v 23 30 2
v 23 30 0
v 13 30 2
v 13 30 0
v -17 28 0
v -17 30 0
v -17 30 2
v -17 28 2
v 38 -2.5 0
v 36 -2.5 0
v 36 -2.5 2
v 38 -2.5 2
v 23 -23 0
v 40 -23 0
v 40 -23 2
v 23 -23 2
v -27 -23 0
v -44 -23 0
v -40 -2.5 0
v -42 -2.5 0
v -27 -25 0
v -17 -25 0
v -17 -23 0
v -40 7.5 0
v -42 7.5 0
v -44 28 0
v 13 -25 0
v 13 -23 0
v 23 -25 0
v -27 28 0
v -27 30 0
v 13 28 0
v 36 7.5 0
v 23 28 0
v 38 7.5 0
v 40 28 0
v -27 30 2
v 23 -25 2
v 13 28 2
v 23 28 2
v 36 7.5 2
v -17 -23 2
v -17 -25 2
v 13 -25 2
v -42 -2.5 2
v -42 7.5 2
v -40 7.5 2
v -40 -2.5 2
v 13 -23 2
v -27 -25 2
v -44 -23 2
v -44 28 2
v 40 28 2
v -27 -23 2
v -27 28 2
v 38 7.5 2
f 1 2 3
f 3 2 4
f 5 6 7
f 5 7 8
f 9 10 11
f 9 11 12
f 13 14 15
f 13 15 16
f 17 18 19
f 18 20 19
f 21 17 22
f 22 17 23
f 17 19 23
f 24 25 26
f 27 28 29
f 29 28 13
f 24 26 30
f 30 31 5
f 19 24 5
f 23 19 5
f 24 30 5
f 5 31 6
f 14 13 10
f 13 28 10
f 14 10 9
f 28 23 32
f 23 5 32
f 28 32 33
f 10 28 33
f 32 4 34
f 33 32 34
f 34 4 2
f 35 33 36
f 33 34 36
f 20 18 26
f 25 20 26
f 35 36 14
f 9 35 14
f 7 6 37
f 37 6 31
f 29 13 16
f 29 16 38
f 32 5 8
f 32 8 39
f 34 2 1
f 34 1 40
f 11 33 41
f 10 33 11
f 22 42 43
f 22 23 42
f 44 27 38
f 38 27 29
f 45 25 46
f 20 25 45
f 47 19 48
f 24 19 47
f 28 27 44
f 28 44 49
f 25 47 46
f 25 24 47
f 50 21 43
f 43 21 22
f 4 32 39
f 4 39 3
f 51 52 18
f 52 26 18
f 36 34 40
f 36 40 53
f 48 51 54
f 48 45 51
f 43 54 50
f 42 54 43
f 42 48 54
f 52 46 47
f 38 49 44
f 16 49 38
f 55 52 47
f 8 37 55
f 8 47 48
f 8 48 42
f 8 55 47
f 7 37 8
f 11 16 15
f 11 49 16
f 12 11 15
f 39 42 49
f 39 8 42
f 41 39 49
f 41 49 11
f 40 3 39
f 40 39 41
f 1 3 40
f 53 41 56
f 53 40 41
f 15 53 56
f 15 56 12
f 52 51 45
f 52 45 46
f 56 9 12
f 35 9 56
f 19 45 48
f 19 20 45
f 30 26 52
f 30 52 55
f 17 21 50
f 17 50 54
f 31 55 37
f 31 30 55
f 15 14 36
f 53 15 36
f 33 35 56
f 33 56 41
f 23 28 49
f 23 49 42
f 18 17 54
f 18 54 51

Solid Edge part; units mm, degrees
sketch "Sketch1" plane through (0, 0, 0) normal (0, 0, 1) x (1, 0, 0)
  line L0 (40, -25) -> (40, 30)
  line L1 (40, 30) -> (-44, 30)
  line L2 (-44, 30) -> (-44, -25)
  line L3 (-44, -25) -> (40, -25)
extrude "ExtrudedProtrusion_3" add sketch "Sketch1" along normal blind 2
sketch "Sketch2" plane through (0, 0, 0) normal (0, 0, 1) x (1, 0, 0)
  line L0 (-44, 28) -> (-27, 28)
  line L1 (-27, 28) -> (-27, 30)
  line L2 (-27, 30) -> (-44, 30)
  line L3 (-44, 30) -> (-44, 28)
extrude "ExtrudedCutout_9" cut sketch "Sketch2" along normal blind 2
sketch "Sketch3" plane through (0, 0, 0) normal (0, 0, 1) x (1, 0, 0)
  line L0 (-17, 28) -> (13, 28)
  line L1 (13, 28) -> (13, 30)
  line L2 (13, 30) -> (-17, 30)
  line L3 (-17, 30) -> (-17, 28)
extrude "ExtrudedCutout_10" cut sketch "Sketch3" along normal blind 2
sketch "Sketch4" plane through (0, 0, 0) normal (0, 0, 1) x (1, 0, 0)
  line L0 (23, 28) -> (40, 28)
  line L1 (40, 28) -> (40, 30)
  line L2 (40, 30) -> (23, 30)
  line L3 (23, 30) -> (23, 28)
extrude "ExtrudedCutout_11" cut sketch "Sketch4" along normal blind 2
sketch "Sketch5" plane through (0, 0, 0) normal (0, 0, 1) x (1, 0, 0)
  line L0 (38, -2.5) -> (38, 7.5)
  line L1 (38, 7.5) -> (36, 7.5)
  line L2 (36, 7.5) -> (36, -2.5)
  line L3 (36, -2.5) -> (38, -2.5)
extrude "ExtrudedCutout_12" cut sketch "Sketch5" along normal blind 2
sketch "Sketch6" plane through (0, 0, 0) normal (0, 0, 1) x (1, 0, 0)
  line L0 (40, -23) -> (23, -23)
  line L1 (23, -23) -> (23, -25)
  line L2 (23, -25) -> (40, -25)
  line L3 (40, -25) -> (40, -23)
extrude "ExtrudedCutout_13" cut sketch "Sketch6" along normal blind 2
sketch "Sketch7" plane through (0, 0, 0) normal (0, 0, 1) x (1, 0, 0)
  line L0 (13, -23) -> (-17, -23)
  line L1 (-17, -23) -> (-17, -25)
  line L2 (-17, -25) -> (13, -25)
  line L3 (13, -25) -> (13, -23)
extrude "ExtrudedCutout_14" cut sketch "Sketch7" along normal blind 2
sketch "Sketch8" plane through (0, 0, 0) normal (0, 0, 1) x (1, 0, 0)
  line L0 (-27, -23) -> (-44, -23)
  line L1 (-44, -23) -> (-44, -25)
  line L2 (-44, -25) -> (-27, -25)
  line L3 (-27, -25) -> (-27, -23)
extrude "ExtrudedCutout_15" cut sketch "Sketch8" along normal blind 2
sketch "Sketch9" plane through (0, 0, 0) normal (0, 0, 1) x (1, 0, 0)
  line L0 (-40, -2.5) -> (-40, 7.5)
  line L1 (-40, 7.5) -> (-42, 7.5)
  line L2 (-42, 7.5) -> (-42, -2.5)
  line L3 (-42, -2.5) -> (-40, -2.5)
extrude "ExtrudedCutout_16" cut sketch "Sketch9" along normal blind 2
properties material "Acrylic, high impact grade"
